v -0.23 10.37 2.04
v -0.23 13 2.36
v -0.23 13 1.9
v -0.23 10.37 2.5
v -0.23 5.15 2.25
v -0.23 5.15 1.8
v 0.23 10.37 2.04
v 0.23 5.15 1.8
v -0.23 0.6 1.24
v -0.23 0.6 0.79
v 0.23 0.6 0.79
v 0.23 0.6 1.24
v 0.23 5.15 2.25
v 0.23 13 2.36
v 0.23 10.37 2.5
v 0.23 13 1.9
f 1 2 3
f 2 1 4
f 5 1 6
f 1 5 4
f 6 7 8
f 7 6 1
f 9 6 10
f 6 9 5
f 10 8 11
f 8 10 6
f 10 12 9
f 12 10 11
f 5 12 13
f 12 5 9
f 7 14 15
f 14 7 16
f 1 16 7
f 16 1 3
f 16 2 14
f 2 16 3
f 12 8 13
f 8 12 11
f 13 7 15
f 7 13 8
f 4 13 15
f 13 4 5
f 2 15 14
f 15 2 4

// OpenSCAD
// file: ../../p/rect3.scad
use <../lib.scad>
function ldraw_lib__rect3() = [
// 0 Rectangle with 3 Edges
// 0 Name: rect3.dat
// 0 Author: Mark Kennedy [mkennedy]
// 0 !LDRAW_ORG Primitive UPDATE 2010-01
// 0 !LICENSE Licensed under CC BY 4.0 : see CAreadme.txt
// 
// 0 BFC CERTIFY CCW
  [0,"BFC","CERTIFY"],
  [0,"BFC","CCW"],
// 
// 0 !HISTORY 2003-08-01 [PTadmin] Official Update 2003-02
// 0 !HISTORY 2007-06-24 [PTadmin] Header formatted for Contributor Agreement
// 0 !HISTORY 2008-07-01 [PTadmin] Official Update 2008-01
// 0 !HISTORY 2010-01-17 [mikeheide] Change winding to CCW
// 0 !HISTORY 2010-04-05 [PTadmin] Official Update 2010-01
// 
// 
// 2 24 1 0 1 -1 0 1
  [2,24,1,0,1,-1,0,1],
// 2 24 1 0 1 1 0 -1
  [2,24,1,0,1,1,0,-1],
// 2 24 -1 0 1 -1 0 -1
  [2,24,-1,0,1,-1,0,-1],
// 4 16 -1 0 1 -1 0 -1 1 0 -1 1 0 1
  [4,16,-1,0,1,-1,0,-1,1,0,-1,1,0,1],
// 0 //
];
module ldraw_lib__rect3(step=0, col=false, unit=2/5, alt=false, line=0.2, solid=!$preview)
    makepoly(ldraw_lib__rect3(), step=step, col=col, unit=unit, alt=alt, line=line, solid=solid);
ldraw_lib__rect3(line=0.2);
// file: ../../p/rect2p.scad
use <../lib.scad>
function ldraw_lib__rect2p() = [
// 0 Rectangle with 2 Parallel Edges
// 0 Name: rect2p.dat
// 0 Author: Donald Sutter [technog]
// 0 !LDRAW_ORG Primitive UPDATE 2010-01
// 0 !LICENSE Licensed under CC BY 4.0 : see CAreadme.txt
// 
// 0 BFC CERTIFY CCW
  [0,"BFC","CERTIFY"],
  [0,"BFC","CCW"],
// 
// 0 !HISTORY 2003-08-01 [PTadmin] Official Update 2003-02
// 0 !HISTORY 2007-06-24 [PTadmin] Header formatted for Contributor Agreement
// 0 !HISTORY 2008-07-01 [PTadmin] Official Update 2008-01
// 0 !HISTORY 2010-01-17 [mikeheide] changed winding to CCW
// 0 !HISTORY 2010-04-05 [PTadmin] Official Update 2010-01
// 
// 
// 2 24 1 0 1 -1 0 1
  [2,24,1,0,1,-1,0,1],
// 2 24 -1 0 -1 1 0 -1
  [2,24,-1,0,-1,1,0,-1],
// 4 16 -1 0 1 -1 0 -1 1 0 -1 1 0 1
  [4,16,-1,0,1,-1,0,-1,1,0,-1,1,0,1],
// 0
];
module ldraw_lib__rect2p(step=0, col=false, unit=2/5, alt=false, line=0.2, solid=!$preview)
    makepoly(ldraw_lib__rect2p(), step=step, col=col, unit=unit, alt=alt, line=line, solid=solid);
ldraw_lib__rect2p(line=0.2);
// file: ../../p/rect2a.scad
use <../lib.scad>
function ldraw_lib__rect2a() = [
// 0 Rectangle with 2 Adjacent Edges
// 0 Name: rect2a.dat
// 0 Author: Chris Dee [cwdee]
// 0 !LDRAW_ORG Primitive UPDATE 2010-01
// 0 !LICENSE Licensed under CC BY 4.0 : see CAreadme.txt
// 
// 0 BFC CERTIFY CCW
  [0,"BFC","CERTIFY"],
  [0,"BFC","CCW"],
// 
// 0 !HISTORY 2003-12-19 [PTadmin] Official Update 2003-03
// 0 !HISTORY 2007-06-24 [PTadmin] Header formatted for Contributor Agreement
// 0 !HISTORY 2008-07-01 [PTadmin] Official Update 2008-01
// 0 !HISTORY 2010-01-17 [mikeheide] changed winding to CCW
// 0 !HISTORY 2010-04-05 [PTadmin] Official Update 2010-01
// 
// 
// 2 24 1 0 1 -1 0 1
  [2,24,1,0,1,-1,0,1],
// 2 24 1 0 -1 1 0 1
  [2,24,1,0,-1,1,0,1],
// 4 16 -1 0 1 -1 0 -1 1 0 -1 1 0 1
  [4,16,-1,0,1,-1,0,-1,1,0,-1,1,0,1],
// 0
];
module ldraw_lib__rect2a(step=0, col=false, unit=2/5, alt=false, line=0.2, solid=!$preview)
    makepoly(ldraw_lib__rect2a(), step=step, col=col, unit=unit, alt=alt, line=line, solid=solid);
ldraw_lib__rect2a(line=0.2);
// file: ../../p/rect1.scad
use <../lib.scad>
function ldraw_lib__rect1() = [
// 0 Rectangle with 1 Edge
// 0 Name: rect1.dat
// 0 Author: Chris Dee [cwdee]
// 0 !LDRAW_ORG Primitive UPDATE 2010-01
// 0 !LICENSE Licensed under CC BY 4.0 : see CAreadme.txt
// 
// 0 BFC CERTIFY CCW
  [0,"BFC","CERTIFY"],
  [0,"BFC","CCW"],
// 
// 0 !HISTORY 2003-12-19 [PTadmin] Official Update 2003-03
// 0 !HISTORY 2007-06-24 [PTadmin] Header formatted for Contributor Agreement
// 0 !HISTORY 2008-07-01 [PTadmin] Official Update 2008-01
// 0 !HISTORY 2010-01-17 [mikeheide] changed winding to CCW
// 0 !HISTORY 2010-04-05 [PTadmin] Official Update 2010-01
// 
// 
// 2 24 1 0 -1 1 0 1
  [2,24,1,0,-1,1,0,1],
// 4 16 -1 0 1 -1 0 -1 1 0 -1 1 0 1
  [4,16,-1,0,1,-1,0,-1,1,0,-1,1,0,1],
// 0
];
module ldraw_lib__rect1(step=0, col=false, unit=2/5, alt=false, line=0.2, solid=!$preview)
    makepoly(ldraw_lib__rect1(), step=step, col=col, unit=unit, alt=alt, line=line, solid=solid);
ldraw_lib__rect1(line=0.2);
// main file
use <../../lib.scad>
use <../../p/rect1.scad>
use <../../p/rect2a.scad>
use <../../p/rect2p.scad>
use <../../p/rect3.scad>
function ldraw_lib__s__u9432s01() = [
// 0 ~Electric Constraction Eyes  4.5 x  2 x  1.5 Light-Up LED - Anode
// 0 Name: s\u9432s01.dat
// 0 Author: Santeri Piippo [arezey]
// 0 !LDRAW_ORG Subpart UPDATE 2024-05
// 0 !LICENSE Licensed under CC BY 4.0 : see CAreadme.txt
// 
// 0 BFC CERTIFY CCW
  [0,"BFC","CERTIFY"],
  [0,"BFC","CCW"],
// 
// 0 !HISTORY 2024-06-30 [OrionP] Official Update 2024-05
// 
// 
// 1 16 -0.575 -5.5 29.2125 0 1 0 -0.575 0 0.175 0 0 3.2875 rect3.dat
  [1,16,-0.575,-5.5,29.2125,0,1,0,-0.575,0,0.175,0,0,3.2875, ldraw_lib__rect3()],
// 4 16 -0.575 -6.25 25.925 -0.575 -5.1 25.925 -0.575 -4.5 12.875 -0.575 -5.625 12.875
  [4,16,-0.575,-6.25,25.925,-0.575,-5.1,25.925,-0.575,-4.5,12.875,-0.575,-5.625,12.875],
// 1 16 0 -4.8 19.4 0 0 -0.575 0.3 -1 0 -6.525 0 0 rect2p.dat
  [1,16,0,-4.8,19.4,0,0,-0.575,0.3,-1,0,-6.525,0,0, ldraw_lib__rect2p()],
// 1 16 -0.575 -3.8 7.1875 0 1 0 1.2625 0 -0.5625 -5.6875 0 0 rect2p.dat
  [1,16,-0.575,-3.8,7.1875,0,1,0,1.2625,0,-0.5625,-5.6875,0,0, ldraw_lib__rect2p()],
// 5 24 -0.575 -5.1 25.925 0.575 -5.1 25.925 0.575 -4.5 12.875 -0.575 -4.75 32.5
  [5,24,-0.575,-5.1,25.925,0.575,-5.1,25.925,0.575,-4.5,12.875,-0.575,-4.75,32.5],
// 1 16 0 -3.2375 7.1875 0.575 0 0 0 -1 1.2625 0 0 -5.6875 rect2a.dat
  [1,16,0,-3.2375,7.1875,0.575,0,0,0,-1,1.2625,0,0,-5.6875, ldraw_lib__rect2a()],
// 1 16 0 -2.5375 1.5 0.575 0 0 0 0 -0.5625 0 1 0 rect3.dat
  [1,16,0,-2.5375,1.5,0.575,0,0,0,0,-0.5625,0,1,0, ldraw_lib__rect3()],
// 5 24 .575 -4.5 12.875 -.575 -4.5 12.875 .575 -5.125 25.925 .575 -1.975 1.5
  [5,24,.575,-4.5,12.875,-.575,-4.5,12.875,.575,-5.125,25.925,.575,-1.975,1.5],
// 1 16 0 -4.3625 7.1875 0.575 0 0 0 1 -1.2625 0 0 5.6875 rect1.dat
  [1,16,0,-4.3625,7.1875,0.575,0,0,0,1,-1.2625,0,0,5.6875, ldraw_lib__rect1()],
// 1 16 0.575 -5.5 29.2125 0 -1 0 0.575 0 0.175 0 0 3.2875 rect3.dat
  [1,16,0.575,-5.5,29.2125,0,-1,0,0.575,0,0.175,0,0,3.2875, ldraw_lib__rect3()],
// 1 16 0 -4.925 29.2125 0 0 0.575 0.175 -1 0 3.2875 0 0 rect1.dat
  [1,16,0,-4.925,29.2125,0,0,0.575,0.175,-1,0,3.2875,0,0, ldraw_lib__rect1()],
// 1 16 0 -5.325 32.5 0 0 0.575 -0.575 0 0 0 -1 0 rect1.dat
  [1,16,0,-5.325,32.5,0,0,0.575,-0.575,0,0,0,-1,0, ldraw_lib__rect1()],
// 4 16 .575 -3.1 1.5 .575 -1.975 1.5 .575 -4.5 12.875 .575 -5.625 12.875
  [4,16,.575,-3.1,1.5,.575,-1.975,1.5,.575,-4.5,12.875,.575,-5.625,12.875],
// 5 24 0.575 -5.625 12.875 -0.575 -5.625 12.875 0.575 -6.25 25.925 0.575 -3.1 1.5
  [5,24,0.575,-5.625,12.875,-0.575,-5.625,12.875,0.575,-6.25,25.925,0.575,-3.1,1.5],
// 4 16 0.575 -5.625 12.875 0.575 -4.5 12.875 0.575 -5.1 25.925 0.575 -6.25 25.925
  [4,16,0.575,-5.625,12.875,0.575,-4.5,12.875,0.575,-5.1,25.925,0.575,-6.25,25.925],
// 1 16 0 -5.9375 19.4 0 0 -0.575 -0.3125 1 0 6.525 0 0 rect2p.dat
  [1,16,0,-5.9375,19.4,0,0,-0.575,-0.3125,1,0,6.525,0,0, ldraw_lib__rect2p()],
// 5 24 -0.575 -6.25 25.925 0.575 -6.25 25.925 0.575 -5.9 32.5 0.575 -5.625 12.875
  [5,24,-0.575,-6.25,25.925,0.575,-6.25,25.925,0.575,-5.9,32.5,0.575,-5.625,12.875],
// 4 16 0.575 -6.25 25.925 0.575 -5.9 32.5 -0.575 -5.9 32.5 -0.575 -6.25 25.925
  [4,16,0.575,-6.25,25.925,0.575,-5.9,32.5,-0.575,-5.9,32.5,-0.575,-6.25,25.925],
];
module ldraw_lib__s__u9432s01(step=0, col=false, unit=2/5, alt=false, line=0.2, solid=!$preview)
    makepoly(ldraw_lib__s__u9432s01(), step=step, col=col, unit=unit, alt=alt, line=line, solid=solid);
ldraw_lib__s__u9432s01(line=0.2);
